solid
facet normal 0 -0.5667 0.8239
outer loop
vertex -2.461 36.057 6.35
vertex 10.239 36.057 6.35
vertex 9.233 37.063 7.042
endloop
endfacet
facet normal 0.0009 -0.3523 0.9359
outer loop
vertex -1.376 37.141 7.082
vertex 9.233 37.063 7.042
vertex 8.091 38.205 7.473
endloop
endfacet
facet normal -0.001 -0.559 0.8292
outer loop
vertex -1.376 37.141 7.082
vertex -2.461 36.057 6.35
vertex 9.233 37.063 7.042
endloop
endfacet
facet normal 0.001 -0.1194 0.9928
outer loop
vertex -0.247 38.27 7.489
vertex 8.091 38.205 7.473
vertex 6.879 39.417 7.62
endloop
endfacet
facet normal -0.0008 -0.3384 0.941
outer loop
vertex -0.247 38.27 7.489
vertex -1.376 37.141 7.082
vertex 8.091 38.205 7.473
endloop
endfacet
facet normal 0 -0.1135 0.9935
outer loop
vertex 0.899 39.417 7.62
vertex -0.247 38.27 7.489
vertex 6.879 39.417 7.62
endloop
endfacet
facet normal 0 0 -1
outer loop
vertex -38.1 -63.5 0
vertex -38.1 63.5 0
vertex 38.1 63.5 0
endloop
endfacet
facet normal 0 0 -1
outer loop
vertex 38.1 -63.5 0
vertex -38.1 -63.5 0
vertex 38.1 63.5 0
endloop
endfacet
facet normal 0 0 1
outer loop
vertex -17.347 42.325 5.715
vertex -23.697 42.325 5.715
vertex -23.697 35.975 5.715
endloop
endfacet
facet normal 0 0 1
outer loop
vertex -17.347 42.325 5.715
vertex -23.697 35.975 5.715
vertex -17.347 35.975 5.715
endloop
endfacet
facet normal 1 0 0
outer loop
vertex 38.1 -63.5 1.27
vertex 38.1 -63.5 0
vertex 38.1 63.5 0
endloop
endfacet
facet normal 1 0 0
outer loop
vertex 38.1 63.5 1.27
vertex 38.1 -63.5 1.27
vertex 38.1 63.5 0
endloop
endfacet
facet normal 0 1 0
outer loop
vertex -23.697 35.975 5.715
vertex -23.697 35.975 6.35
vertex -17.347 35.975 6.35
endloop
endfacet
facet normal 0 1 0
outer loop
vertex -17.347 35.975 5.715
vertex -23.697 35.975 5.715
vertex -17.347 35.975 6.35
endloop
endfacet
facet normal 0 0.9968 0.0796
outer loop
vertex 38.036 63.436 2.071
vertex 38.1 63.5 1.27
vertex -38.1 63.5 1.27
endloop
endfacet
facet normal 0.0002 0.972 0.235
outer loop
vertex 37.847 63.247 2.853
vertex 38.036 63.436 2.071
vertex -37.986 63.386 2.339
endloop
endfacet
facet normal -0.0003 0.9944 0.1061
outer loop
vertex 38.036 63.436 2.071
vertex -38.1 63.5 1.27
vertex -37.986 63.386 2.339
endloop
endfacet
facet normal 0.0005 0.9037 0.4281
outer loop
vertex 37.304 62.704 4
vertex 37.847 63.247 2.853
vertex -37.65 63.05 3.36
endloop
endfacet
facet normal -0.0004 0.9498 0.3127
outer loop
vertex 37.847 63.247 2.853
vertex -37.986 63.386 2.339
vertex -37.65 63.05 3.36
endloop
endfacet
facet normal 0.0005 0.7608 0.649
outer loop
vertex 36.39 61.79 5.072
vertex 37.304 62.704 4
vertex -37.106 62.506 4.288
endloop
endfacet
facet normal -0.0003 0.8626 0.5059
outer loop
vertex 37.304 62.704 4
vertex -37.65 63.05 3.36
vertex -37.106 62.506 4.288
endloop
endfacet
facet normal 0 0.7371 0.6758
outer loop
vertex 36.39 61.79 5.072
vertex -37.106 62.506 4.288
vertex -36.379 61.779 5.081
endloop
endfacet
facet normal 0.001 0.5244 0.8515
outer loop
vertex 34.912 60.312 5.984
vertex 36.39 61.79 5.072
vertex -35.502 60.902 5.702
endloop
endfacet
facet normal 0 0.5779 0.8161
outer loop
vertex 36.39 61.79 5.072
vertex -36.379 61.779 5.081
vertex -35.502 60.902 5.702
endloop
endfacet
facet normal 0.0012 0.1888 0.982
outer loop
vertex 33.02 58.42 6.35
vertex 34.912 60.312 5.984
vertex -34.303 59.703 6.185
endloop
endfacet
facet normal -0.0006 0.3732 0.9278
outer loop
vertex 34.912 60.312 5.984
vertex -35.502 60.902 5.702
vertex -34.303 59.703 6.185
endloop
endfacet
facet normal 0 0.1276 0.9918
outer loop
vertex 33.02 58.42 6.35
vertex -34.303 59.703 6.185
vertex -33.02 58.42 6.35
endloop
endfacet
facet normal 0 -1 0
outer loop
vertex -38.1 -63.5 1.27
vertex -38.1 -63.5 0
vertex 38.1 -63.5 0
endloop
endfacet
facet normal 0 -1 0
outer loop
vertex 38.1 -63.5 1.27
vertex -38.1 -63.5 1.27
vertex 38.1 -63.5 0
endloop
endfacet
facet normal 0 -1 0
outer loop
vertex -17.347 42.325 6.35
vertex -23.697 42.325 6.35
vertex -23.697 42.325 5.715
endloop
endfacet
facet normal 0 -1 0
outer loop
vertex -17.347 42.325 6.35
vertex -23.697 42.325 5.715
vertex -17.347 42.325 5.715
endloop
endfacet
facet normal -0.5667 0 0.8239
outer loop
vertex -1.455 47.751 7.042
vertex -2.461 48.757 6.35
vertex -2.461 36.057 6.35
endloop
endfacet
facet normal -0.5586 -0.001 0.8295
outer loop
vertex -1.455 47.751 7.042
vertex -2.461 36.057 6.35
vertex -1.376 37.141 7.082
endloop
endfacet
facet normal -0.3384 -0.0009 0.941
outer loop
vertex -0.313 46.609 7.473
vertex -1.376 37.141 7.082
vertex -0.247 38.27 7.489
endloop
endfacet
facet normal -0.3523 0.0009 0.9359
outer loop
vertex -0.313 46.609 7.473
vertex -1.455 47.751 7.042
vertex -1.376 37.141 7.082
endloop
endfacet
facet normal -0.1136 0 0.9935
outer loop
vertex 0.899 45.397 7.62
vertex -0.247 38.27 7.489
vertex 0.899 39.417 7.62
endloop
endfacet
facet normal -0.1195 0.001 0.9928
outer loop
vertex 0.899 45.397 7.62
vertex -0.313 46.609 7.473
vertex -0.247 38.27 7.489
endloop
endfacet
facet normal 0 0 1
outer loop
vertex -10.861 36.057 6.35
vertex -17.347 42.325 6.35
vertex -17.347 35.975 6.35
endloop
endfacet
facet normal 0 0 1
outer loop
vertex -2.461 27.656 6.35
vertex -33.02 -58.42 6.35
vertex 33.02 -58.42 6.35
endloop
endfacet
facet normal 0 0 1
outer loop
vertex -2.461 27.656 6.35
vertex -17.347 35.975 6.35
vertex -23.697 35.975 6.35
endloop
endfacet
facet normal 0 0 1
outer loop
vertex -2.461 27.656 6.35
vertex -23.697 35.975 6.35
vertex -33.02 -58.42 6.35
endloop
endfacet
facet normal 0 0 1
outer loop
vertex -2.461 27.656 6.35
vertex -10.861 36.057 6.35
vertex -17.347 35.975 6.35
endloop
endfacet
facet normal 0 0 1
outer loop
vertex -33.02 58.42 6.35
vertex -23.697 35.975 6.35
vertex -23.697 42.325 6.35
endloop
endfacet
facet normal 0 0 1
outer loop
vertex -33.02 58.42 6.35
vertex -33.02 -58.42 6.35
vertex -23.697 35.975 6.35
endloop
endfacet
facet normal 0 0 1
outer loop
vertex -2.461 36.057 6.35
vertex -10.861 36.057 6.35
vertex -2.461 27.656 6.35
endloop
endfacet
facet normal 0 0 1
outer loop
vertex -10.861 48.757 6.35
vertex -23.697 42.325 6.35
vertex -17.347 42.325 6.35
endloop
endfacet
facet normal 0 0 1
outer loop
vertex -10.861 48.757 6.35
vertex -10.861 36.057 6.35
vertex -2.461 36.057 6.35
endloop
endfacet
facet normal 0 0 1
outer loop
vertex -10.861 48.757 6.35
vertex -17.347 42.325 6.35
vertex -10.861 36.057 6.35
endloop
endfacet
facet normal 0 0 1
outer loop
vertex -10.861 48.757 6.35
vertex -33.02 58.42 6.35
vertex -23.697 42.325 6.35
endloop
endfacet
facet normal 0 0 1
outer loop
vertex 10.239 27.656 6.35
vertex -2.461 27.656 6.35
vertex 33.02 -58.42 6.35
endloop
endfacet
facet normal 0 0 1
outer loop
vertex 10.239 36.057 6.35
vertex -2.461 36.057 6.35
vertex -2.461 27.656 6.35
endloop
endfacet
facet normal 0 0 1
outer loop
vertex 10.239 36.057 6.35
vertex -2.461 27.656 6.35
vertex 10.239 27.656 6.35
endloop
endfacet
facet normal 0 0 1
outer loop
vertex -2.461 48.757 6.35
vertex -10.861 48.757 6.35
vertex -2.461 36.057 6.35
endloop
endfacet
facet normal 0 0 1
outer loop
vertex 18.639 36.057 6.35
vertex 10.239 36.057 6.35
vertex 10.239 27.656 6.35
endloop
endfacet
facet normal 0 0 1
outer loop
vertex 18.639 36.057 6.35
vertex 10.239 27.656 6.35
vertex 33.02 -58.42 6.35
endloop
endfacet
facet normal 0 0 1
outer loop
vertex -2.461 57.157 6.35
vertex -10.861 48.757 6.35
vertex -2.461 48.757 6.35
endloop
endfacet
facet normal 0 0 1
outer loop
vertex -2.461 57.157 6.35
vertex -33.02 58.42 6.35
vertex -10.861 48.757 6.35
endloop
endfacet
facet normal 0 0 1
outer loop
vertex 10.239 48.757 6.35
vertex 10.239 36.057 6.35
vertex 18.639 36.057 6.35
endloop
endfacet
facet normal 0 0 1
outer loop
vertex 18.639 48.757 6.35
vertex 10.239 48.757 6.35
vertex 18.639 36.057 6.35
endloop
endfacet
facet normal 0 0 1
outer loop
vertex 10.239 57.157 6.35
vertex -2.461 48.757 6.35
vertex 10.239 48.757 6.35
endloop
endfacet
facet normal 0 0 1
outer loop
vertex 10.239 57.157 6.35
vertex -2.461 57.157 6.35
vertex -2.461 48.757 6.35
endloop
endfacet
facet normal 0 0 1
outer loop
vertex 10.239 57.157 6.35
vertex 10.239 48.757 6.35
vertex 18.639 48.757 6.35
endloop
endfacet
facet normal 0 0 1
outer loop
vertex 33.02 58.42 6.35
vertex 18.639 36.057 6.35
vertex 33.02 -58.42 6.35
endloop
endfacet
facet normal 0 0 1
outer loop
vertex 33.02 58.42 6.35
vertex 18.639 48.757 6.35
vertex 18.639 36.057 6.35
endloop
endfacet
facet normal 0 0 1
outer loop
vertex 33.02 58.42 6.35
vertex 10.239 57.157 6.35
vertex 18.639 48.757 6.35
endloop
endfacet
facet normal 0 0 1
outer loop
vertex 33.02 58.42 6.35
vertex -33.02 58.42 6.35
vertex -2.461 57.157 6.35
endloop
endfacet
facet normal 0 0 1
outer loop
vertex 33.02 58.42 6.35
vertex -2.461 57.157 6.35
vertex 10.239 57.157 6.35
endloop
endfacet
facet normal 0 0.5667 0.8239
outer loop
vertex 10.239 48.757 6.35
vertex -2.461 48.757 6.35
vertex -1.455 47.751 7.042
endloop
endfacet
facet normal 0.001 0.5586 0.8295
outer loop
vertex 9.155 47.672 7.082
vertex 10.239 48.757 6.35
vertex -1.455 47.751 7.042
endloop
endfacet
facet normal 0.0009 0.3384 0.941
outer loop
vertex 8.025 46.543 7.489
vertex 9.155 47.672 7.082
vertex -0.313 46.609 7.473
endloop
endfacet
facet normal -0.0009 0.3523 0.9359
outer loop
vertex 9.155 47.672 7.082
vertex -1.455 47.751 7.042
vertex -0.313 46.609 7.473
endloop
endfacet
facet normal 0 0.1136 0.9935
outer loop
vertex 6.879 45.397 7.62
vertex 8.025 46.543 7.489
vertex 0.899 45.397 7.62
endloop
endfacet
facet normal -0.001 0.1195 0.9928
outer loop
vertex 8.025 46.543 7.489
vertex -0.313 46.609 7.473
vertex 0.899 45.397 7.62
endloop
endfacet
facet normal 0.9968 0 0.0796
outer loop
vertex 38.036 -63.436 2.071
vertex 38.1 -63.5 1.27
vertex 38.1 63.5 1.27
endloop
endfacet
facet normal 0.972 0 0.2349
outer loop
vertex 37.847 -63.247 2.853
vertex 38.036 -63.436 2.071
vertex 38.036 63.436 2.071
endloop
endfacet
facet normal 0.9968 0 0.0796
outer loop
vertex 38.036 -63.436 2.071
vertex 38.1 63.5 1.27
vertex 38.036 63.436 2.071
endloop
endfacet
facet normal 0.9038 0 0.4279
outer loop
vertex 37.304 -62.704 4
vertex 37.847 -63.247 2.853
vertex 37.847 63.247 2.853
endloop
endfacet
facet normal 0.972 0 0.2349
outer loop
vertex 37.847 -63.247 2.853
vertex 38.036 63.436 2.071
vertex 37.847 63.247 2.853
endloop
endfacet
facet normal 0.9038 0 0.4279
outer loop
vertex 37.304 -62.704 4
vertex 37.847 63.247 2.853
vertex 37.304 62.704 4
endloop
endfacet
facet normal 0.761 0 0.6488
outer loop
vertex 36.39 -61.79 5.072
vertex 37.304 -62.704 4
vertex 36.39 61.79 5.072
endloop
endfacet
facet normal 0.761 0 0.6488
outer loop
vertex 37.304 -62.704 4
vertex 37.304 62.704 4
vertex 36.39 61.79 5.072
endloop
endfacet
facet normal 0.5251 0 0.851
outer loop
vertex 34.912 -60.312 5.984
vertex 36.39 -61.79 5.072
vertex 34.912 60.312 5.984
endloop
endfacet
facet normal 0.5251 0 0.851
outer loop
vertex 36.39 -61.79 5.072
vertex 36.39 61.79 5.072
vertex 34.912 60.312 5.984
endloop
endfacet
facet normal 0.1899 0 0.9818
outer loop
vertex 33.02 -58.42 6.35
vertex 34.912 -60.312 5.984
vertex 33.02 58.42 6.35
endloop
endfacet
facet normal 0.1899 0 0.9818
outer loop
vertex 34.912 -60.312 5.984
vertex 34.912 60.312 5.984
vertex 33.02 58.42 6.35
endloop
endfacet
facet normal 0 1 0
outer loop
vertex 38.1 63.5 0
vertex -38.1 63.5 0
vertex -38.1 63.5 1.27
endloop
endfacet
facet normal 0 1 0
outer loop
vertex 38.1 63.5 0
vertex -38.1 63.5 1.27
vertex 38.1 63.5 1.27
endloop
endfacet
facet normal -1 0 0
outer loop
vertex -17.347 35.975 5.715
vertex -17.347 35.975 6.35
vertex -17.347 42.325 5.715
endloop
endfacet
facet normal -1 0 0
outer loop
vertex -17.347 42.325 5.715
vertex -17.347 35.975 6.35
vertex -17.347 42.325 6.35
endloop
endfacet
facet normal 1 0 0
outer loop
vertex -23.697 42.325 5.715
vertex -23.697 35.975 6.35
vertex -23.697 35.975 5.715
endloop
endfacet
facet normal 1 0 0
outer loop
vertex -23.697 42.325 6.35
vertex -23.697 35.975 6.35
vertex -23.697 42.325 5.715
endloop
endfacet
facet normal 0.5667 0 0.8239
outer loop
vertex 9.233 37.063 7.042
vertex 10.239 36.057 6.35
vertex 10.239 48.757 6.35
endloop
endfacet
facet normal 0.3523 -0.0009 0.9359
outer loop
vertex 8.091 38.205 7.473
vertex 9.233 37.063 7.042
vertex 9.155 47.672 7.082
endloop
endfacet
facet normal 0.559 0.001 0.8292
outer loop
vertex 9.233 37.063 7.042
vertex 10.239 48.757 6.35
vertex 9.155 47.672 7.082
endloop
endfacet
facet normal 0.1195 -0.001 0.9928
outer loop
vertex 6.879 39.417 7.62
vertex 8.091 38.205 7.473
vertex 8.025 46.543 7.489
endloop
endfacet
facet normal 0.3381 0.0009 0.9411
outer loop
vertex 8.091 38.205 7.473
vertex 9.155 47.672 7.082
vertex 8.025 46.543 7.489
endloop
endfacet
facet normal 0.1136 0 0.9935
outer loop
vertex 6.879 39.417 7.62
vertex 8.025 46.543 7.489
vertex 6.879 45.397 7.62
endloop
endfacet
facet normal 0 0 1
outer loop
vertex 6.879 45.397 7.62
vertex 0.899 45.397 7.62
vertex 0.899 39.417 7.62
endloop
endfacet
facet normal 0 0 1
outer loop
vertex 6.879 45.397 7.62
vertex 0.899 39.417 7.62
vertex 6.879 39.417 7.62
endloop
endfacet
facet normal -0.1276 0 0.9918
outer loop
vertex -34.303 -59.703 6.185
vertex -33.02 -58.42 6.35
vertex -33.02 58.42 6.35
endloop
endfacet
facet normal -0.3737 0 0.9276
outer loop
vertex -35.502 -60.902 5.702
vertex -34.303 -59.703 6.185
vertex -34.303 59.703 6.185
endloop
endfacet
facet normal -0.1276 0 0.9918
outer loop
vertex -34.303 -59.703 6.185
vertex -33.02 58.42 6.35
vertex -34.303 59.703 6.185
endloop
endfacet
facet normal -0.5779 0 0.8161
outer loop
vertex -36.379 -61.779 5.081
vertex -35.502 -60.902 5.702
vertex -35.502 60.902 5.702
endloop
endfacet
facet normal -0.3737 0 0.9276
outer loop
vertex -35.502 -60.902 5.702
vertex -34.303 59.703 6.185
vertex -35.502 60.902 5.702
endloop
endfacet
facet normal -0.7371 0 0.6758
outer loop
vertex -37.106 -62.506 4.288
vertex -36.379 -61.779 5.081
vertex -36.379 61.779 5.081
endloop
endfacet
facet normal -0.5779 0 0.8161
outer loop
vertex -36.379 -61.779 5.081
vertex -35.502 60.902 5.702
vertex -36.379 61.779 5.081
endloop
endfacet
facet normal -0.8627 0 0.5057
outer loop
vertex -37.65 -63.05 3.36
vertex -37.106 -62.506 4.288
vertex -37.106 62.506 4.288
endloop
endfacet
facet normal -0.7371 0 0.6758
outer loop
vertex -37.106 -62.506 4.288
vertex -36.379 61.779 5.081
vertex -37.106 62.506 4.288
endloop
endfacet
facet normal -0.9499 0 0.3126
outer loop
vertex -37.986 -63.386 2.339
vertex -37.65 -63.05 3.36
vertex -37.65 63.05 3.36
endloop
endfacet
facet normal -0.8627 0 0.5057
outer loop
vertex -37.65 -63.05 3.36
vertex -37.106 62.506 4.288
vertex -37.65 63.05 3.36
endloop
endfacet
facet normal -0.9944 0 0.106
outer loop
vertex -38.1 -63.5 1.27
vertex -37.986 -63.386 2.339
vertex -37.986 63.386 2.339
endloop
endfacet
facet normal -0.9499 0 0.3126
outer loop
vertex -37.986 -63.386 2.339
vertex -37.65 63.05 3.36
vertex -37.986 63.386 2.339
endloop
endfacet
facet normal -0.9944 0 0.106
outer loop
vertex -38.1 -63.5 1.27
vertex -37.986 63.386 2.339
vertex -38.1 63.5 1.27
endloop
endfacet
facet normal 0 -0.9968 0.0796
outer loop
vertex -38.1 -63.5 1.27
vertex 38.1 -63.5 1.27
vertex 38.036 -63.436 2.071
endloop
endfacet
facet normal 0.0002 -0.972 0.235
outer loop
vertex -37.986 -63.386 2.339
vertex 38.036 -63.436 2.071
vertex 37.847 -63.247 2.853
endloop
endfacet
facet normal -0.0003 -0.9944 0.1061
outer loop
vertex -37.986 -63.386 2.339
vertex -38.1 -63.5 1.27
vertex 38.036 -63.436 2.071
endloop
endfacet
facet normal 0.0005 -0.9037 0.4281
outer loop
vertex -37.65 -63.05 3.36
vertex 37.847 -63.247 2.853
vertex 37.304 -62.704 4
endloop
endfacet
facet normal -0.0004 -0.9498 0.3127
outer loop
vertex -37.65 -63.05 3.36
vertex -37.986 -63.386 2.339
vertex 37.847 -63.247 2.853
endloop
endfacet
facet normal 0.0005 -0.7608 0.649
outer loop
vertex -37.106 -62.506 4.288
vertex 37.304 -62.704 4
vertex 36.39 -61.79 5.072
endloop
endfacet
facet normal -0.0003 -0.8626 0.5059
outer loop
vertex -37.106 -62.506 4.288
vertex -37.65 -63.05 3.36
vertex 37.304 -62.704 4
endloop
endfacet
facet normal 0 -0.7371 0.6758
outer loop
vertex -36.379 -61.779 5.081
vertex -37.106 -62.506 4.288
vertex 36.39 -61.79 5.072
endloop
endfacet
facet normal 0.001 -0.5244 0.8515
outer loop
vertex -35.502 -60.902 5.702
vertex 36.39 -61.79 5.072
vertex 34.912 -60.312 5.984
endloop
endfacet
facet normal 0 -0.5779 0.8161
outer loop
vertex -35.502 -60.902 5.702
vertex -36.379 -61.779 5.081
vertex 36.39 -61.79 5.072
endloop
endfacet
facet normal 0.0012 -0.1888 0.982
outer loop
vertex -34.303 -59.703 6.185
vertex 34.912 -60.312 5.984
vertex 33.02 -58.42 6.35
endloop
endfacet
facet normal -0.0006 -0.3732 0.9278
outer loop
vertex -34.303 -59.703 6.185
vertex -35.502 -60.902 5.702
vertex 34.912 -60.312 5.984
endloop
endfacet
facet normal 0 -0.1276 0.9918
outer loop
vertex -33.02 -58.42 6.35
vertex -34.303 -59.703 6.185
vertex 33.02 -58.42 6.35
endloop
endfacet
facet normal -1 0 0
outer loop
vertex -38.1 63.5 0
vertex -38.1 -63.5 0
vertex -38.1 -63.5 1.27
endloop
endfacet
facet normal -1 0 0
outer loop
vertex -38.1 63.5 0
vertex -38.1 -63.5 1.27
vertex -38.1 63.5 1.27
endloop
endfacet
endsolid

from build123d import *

# Parameters (mm, degrees)
F0_W        = 76.2
F0_H        = 127
F1_DEPTH    = 6.35
F2_W        = 12.7
F2_H        = 12.7
F3_DEPTH    = 1.27
F4_W        = 6.35
F4_H        = 6.35
F5_DEPTH    = 0.635
F6_T1_DEPTH = 29.5005208253
F6_T3_DEPTH = 29.5005208253
F6_T5_DEPTH = 152.4
F6_T7_DEPTH = 101.6


# Not quite as in the source:
# - a fillet or chamfer that OpenCascade refuses, or shapes differently, is made with other operations: its cross-section is extruded or revolved along the edge and cut away or added


with BuildPart() as f1:
    # F0 (on Top) → F1 (new body)
    with BuildSketch(Plane.XY):
        Rectangle(F0_W, F0_H)
    extrude(amount=F1_DEPTH)

    # F2 (on face) → F3 (join)
    with BuildSketch(Plane.XY.offset(6.35)):
        with Locations((3.8891917182, 42.4066188663)):
            Rectangle(F2_W, F2_H)
    extrude(amount=F3_DEPTH)

    # F4 (on face) → F5 (cut)
    with BuildSketch(Plane.XY.offset(6.35)):
        with Locations((-20.5224687852, 39.1501502216)):
            Rectangle(F4_W, F4_H)
    extrude(amount=-F5_DEPTH, mode=Mode.SUBTRACT)

    # F6: fillet of radius 5.08 on 8 edges, made by hand

    # F6_s2 → F6_t1 (cut)
    with BuildSketch(Plane.XZ.offset(-57.156879279)):
        with BuildLine():
            ThreePointArc((10.2391917182, 6.35), (8.6751387773, 7.2919048812), (6.8790875531, 7.62))
            Line((6.8790875531, 7.62), (10.2391917182, 7.62))
            Line((10.2391917182, 7.62), (10.2391917182, 6.35))
        make_face()
        with BuildLine():
            ThreePointArc((-2.4608082818, 6.35), (-0.896755341, 7.2919048812), (0.8992958832, 7.62))
            Line((0.8992958832, 7.62), (-2.4608082818, 7.62))
            Line((-2.4608082818, 7.62), (-2.4608082818, 6.35))
        make_face()
    extrude(amount=F6_T1_DEPTH, mode=Mode.SUBTRACT)

    # F6_s4 → F6_t3 (cut)
    with BuildSketch(Plane.YZ.offset(-10.8610686945)):
        with BuildLine():
            ThreePointArc((48.7566188663, 6.35), (47.1925659255, 7.2919048812), (45.3965147013, 7.62))
            Line((45.3965147013, 7.62), (48.7566188663, 7.62))
            Line((48.7566188663, 7.62), (48.7566188663, 6.35))
        make_face()
        with BuildLine():
            ThreePointArc((36.0566188663, 6.35), (37.6206718072, 7.2919048812), (39.4167230314, 7.62))
            Line((39.4167230314, 7.62), (36.0566188663, 7.62))
            Line((36.0566188663, 7.62), (36.0566188663, 6.35))
        make_face()
    extrude(amount=F6_T3_DEPTH, mode=Mode.SUBTRACT)

    # F6_s6 → F6_t5 (cut)
    with BuildSketch(Plane.XZ.offset(-76.2)):
        with BuildLine():
            ThreePointArc((38.1, 1.27), (36.6121024484, 4.8621024484), (33.02, 6.35))
            Line((33.02, 6.35), (38.1, 6.35))
            Line((38.1, 6.35), (38.1, 1.27))
        make_face()
        with BuildLine():
            ThreePointArc((-33.02, 6.35), (-36.6121024484, 4.8621024484), (-38.1, 1.27))
            Line((-38.1, 1.27), (-38.1, 6.35))
            Line((-38.1, 6.35), (-33.02, 6.35))
        make_face()
    extrude(amount=F6_T5_DEPTH, mode=Mode.SUBTRACT)

    # F6_s8 → F6_t7 (cut)
    with BuildSketch(Plane.YZ.offset(-50.8)):
        with BuildLine():
            ThreePointArc((-63.5, 1.27), (-62.0121024484, 4.8621024484), (-58.42, 6.35))
            Line((-58.42, 6.35), (-63.5, 6.35))
            Line((-63.5, 6.35), (-63.5, 1.27))
        make_face()
        with BuildLine():
            ThreePointArc((63.5, 1.27), (62.0121024484, 4.8621024484), (58.42, 6.35))
            Line((58.42, 6.35), (63.5, 6.35))
            Line((63.5, 6.35), (63.5, 1.27))
        make_face()
    extrude(amount=F6_T7_DEPTH, mode=Mode.SUBTRACT)


solid = f1.part
